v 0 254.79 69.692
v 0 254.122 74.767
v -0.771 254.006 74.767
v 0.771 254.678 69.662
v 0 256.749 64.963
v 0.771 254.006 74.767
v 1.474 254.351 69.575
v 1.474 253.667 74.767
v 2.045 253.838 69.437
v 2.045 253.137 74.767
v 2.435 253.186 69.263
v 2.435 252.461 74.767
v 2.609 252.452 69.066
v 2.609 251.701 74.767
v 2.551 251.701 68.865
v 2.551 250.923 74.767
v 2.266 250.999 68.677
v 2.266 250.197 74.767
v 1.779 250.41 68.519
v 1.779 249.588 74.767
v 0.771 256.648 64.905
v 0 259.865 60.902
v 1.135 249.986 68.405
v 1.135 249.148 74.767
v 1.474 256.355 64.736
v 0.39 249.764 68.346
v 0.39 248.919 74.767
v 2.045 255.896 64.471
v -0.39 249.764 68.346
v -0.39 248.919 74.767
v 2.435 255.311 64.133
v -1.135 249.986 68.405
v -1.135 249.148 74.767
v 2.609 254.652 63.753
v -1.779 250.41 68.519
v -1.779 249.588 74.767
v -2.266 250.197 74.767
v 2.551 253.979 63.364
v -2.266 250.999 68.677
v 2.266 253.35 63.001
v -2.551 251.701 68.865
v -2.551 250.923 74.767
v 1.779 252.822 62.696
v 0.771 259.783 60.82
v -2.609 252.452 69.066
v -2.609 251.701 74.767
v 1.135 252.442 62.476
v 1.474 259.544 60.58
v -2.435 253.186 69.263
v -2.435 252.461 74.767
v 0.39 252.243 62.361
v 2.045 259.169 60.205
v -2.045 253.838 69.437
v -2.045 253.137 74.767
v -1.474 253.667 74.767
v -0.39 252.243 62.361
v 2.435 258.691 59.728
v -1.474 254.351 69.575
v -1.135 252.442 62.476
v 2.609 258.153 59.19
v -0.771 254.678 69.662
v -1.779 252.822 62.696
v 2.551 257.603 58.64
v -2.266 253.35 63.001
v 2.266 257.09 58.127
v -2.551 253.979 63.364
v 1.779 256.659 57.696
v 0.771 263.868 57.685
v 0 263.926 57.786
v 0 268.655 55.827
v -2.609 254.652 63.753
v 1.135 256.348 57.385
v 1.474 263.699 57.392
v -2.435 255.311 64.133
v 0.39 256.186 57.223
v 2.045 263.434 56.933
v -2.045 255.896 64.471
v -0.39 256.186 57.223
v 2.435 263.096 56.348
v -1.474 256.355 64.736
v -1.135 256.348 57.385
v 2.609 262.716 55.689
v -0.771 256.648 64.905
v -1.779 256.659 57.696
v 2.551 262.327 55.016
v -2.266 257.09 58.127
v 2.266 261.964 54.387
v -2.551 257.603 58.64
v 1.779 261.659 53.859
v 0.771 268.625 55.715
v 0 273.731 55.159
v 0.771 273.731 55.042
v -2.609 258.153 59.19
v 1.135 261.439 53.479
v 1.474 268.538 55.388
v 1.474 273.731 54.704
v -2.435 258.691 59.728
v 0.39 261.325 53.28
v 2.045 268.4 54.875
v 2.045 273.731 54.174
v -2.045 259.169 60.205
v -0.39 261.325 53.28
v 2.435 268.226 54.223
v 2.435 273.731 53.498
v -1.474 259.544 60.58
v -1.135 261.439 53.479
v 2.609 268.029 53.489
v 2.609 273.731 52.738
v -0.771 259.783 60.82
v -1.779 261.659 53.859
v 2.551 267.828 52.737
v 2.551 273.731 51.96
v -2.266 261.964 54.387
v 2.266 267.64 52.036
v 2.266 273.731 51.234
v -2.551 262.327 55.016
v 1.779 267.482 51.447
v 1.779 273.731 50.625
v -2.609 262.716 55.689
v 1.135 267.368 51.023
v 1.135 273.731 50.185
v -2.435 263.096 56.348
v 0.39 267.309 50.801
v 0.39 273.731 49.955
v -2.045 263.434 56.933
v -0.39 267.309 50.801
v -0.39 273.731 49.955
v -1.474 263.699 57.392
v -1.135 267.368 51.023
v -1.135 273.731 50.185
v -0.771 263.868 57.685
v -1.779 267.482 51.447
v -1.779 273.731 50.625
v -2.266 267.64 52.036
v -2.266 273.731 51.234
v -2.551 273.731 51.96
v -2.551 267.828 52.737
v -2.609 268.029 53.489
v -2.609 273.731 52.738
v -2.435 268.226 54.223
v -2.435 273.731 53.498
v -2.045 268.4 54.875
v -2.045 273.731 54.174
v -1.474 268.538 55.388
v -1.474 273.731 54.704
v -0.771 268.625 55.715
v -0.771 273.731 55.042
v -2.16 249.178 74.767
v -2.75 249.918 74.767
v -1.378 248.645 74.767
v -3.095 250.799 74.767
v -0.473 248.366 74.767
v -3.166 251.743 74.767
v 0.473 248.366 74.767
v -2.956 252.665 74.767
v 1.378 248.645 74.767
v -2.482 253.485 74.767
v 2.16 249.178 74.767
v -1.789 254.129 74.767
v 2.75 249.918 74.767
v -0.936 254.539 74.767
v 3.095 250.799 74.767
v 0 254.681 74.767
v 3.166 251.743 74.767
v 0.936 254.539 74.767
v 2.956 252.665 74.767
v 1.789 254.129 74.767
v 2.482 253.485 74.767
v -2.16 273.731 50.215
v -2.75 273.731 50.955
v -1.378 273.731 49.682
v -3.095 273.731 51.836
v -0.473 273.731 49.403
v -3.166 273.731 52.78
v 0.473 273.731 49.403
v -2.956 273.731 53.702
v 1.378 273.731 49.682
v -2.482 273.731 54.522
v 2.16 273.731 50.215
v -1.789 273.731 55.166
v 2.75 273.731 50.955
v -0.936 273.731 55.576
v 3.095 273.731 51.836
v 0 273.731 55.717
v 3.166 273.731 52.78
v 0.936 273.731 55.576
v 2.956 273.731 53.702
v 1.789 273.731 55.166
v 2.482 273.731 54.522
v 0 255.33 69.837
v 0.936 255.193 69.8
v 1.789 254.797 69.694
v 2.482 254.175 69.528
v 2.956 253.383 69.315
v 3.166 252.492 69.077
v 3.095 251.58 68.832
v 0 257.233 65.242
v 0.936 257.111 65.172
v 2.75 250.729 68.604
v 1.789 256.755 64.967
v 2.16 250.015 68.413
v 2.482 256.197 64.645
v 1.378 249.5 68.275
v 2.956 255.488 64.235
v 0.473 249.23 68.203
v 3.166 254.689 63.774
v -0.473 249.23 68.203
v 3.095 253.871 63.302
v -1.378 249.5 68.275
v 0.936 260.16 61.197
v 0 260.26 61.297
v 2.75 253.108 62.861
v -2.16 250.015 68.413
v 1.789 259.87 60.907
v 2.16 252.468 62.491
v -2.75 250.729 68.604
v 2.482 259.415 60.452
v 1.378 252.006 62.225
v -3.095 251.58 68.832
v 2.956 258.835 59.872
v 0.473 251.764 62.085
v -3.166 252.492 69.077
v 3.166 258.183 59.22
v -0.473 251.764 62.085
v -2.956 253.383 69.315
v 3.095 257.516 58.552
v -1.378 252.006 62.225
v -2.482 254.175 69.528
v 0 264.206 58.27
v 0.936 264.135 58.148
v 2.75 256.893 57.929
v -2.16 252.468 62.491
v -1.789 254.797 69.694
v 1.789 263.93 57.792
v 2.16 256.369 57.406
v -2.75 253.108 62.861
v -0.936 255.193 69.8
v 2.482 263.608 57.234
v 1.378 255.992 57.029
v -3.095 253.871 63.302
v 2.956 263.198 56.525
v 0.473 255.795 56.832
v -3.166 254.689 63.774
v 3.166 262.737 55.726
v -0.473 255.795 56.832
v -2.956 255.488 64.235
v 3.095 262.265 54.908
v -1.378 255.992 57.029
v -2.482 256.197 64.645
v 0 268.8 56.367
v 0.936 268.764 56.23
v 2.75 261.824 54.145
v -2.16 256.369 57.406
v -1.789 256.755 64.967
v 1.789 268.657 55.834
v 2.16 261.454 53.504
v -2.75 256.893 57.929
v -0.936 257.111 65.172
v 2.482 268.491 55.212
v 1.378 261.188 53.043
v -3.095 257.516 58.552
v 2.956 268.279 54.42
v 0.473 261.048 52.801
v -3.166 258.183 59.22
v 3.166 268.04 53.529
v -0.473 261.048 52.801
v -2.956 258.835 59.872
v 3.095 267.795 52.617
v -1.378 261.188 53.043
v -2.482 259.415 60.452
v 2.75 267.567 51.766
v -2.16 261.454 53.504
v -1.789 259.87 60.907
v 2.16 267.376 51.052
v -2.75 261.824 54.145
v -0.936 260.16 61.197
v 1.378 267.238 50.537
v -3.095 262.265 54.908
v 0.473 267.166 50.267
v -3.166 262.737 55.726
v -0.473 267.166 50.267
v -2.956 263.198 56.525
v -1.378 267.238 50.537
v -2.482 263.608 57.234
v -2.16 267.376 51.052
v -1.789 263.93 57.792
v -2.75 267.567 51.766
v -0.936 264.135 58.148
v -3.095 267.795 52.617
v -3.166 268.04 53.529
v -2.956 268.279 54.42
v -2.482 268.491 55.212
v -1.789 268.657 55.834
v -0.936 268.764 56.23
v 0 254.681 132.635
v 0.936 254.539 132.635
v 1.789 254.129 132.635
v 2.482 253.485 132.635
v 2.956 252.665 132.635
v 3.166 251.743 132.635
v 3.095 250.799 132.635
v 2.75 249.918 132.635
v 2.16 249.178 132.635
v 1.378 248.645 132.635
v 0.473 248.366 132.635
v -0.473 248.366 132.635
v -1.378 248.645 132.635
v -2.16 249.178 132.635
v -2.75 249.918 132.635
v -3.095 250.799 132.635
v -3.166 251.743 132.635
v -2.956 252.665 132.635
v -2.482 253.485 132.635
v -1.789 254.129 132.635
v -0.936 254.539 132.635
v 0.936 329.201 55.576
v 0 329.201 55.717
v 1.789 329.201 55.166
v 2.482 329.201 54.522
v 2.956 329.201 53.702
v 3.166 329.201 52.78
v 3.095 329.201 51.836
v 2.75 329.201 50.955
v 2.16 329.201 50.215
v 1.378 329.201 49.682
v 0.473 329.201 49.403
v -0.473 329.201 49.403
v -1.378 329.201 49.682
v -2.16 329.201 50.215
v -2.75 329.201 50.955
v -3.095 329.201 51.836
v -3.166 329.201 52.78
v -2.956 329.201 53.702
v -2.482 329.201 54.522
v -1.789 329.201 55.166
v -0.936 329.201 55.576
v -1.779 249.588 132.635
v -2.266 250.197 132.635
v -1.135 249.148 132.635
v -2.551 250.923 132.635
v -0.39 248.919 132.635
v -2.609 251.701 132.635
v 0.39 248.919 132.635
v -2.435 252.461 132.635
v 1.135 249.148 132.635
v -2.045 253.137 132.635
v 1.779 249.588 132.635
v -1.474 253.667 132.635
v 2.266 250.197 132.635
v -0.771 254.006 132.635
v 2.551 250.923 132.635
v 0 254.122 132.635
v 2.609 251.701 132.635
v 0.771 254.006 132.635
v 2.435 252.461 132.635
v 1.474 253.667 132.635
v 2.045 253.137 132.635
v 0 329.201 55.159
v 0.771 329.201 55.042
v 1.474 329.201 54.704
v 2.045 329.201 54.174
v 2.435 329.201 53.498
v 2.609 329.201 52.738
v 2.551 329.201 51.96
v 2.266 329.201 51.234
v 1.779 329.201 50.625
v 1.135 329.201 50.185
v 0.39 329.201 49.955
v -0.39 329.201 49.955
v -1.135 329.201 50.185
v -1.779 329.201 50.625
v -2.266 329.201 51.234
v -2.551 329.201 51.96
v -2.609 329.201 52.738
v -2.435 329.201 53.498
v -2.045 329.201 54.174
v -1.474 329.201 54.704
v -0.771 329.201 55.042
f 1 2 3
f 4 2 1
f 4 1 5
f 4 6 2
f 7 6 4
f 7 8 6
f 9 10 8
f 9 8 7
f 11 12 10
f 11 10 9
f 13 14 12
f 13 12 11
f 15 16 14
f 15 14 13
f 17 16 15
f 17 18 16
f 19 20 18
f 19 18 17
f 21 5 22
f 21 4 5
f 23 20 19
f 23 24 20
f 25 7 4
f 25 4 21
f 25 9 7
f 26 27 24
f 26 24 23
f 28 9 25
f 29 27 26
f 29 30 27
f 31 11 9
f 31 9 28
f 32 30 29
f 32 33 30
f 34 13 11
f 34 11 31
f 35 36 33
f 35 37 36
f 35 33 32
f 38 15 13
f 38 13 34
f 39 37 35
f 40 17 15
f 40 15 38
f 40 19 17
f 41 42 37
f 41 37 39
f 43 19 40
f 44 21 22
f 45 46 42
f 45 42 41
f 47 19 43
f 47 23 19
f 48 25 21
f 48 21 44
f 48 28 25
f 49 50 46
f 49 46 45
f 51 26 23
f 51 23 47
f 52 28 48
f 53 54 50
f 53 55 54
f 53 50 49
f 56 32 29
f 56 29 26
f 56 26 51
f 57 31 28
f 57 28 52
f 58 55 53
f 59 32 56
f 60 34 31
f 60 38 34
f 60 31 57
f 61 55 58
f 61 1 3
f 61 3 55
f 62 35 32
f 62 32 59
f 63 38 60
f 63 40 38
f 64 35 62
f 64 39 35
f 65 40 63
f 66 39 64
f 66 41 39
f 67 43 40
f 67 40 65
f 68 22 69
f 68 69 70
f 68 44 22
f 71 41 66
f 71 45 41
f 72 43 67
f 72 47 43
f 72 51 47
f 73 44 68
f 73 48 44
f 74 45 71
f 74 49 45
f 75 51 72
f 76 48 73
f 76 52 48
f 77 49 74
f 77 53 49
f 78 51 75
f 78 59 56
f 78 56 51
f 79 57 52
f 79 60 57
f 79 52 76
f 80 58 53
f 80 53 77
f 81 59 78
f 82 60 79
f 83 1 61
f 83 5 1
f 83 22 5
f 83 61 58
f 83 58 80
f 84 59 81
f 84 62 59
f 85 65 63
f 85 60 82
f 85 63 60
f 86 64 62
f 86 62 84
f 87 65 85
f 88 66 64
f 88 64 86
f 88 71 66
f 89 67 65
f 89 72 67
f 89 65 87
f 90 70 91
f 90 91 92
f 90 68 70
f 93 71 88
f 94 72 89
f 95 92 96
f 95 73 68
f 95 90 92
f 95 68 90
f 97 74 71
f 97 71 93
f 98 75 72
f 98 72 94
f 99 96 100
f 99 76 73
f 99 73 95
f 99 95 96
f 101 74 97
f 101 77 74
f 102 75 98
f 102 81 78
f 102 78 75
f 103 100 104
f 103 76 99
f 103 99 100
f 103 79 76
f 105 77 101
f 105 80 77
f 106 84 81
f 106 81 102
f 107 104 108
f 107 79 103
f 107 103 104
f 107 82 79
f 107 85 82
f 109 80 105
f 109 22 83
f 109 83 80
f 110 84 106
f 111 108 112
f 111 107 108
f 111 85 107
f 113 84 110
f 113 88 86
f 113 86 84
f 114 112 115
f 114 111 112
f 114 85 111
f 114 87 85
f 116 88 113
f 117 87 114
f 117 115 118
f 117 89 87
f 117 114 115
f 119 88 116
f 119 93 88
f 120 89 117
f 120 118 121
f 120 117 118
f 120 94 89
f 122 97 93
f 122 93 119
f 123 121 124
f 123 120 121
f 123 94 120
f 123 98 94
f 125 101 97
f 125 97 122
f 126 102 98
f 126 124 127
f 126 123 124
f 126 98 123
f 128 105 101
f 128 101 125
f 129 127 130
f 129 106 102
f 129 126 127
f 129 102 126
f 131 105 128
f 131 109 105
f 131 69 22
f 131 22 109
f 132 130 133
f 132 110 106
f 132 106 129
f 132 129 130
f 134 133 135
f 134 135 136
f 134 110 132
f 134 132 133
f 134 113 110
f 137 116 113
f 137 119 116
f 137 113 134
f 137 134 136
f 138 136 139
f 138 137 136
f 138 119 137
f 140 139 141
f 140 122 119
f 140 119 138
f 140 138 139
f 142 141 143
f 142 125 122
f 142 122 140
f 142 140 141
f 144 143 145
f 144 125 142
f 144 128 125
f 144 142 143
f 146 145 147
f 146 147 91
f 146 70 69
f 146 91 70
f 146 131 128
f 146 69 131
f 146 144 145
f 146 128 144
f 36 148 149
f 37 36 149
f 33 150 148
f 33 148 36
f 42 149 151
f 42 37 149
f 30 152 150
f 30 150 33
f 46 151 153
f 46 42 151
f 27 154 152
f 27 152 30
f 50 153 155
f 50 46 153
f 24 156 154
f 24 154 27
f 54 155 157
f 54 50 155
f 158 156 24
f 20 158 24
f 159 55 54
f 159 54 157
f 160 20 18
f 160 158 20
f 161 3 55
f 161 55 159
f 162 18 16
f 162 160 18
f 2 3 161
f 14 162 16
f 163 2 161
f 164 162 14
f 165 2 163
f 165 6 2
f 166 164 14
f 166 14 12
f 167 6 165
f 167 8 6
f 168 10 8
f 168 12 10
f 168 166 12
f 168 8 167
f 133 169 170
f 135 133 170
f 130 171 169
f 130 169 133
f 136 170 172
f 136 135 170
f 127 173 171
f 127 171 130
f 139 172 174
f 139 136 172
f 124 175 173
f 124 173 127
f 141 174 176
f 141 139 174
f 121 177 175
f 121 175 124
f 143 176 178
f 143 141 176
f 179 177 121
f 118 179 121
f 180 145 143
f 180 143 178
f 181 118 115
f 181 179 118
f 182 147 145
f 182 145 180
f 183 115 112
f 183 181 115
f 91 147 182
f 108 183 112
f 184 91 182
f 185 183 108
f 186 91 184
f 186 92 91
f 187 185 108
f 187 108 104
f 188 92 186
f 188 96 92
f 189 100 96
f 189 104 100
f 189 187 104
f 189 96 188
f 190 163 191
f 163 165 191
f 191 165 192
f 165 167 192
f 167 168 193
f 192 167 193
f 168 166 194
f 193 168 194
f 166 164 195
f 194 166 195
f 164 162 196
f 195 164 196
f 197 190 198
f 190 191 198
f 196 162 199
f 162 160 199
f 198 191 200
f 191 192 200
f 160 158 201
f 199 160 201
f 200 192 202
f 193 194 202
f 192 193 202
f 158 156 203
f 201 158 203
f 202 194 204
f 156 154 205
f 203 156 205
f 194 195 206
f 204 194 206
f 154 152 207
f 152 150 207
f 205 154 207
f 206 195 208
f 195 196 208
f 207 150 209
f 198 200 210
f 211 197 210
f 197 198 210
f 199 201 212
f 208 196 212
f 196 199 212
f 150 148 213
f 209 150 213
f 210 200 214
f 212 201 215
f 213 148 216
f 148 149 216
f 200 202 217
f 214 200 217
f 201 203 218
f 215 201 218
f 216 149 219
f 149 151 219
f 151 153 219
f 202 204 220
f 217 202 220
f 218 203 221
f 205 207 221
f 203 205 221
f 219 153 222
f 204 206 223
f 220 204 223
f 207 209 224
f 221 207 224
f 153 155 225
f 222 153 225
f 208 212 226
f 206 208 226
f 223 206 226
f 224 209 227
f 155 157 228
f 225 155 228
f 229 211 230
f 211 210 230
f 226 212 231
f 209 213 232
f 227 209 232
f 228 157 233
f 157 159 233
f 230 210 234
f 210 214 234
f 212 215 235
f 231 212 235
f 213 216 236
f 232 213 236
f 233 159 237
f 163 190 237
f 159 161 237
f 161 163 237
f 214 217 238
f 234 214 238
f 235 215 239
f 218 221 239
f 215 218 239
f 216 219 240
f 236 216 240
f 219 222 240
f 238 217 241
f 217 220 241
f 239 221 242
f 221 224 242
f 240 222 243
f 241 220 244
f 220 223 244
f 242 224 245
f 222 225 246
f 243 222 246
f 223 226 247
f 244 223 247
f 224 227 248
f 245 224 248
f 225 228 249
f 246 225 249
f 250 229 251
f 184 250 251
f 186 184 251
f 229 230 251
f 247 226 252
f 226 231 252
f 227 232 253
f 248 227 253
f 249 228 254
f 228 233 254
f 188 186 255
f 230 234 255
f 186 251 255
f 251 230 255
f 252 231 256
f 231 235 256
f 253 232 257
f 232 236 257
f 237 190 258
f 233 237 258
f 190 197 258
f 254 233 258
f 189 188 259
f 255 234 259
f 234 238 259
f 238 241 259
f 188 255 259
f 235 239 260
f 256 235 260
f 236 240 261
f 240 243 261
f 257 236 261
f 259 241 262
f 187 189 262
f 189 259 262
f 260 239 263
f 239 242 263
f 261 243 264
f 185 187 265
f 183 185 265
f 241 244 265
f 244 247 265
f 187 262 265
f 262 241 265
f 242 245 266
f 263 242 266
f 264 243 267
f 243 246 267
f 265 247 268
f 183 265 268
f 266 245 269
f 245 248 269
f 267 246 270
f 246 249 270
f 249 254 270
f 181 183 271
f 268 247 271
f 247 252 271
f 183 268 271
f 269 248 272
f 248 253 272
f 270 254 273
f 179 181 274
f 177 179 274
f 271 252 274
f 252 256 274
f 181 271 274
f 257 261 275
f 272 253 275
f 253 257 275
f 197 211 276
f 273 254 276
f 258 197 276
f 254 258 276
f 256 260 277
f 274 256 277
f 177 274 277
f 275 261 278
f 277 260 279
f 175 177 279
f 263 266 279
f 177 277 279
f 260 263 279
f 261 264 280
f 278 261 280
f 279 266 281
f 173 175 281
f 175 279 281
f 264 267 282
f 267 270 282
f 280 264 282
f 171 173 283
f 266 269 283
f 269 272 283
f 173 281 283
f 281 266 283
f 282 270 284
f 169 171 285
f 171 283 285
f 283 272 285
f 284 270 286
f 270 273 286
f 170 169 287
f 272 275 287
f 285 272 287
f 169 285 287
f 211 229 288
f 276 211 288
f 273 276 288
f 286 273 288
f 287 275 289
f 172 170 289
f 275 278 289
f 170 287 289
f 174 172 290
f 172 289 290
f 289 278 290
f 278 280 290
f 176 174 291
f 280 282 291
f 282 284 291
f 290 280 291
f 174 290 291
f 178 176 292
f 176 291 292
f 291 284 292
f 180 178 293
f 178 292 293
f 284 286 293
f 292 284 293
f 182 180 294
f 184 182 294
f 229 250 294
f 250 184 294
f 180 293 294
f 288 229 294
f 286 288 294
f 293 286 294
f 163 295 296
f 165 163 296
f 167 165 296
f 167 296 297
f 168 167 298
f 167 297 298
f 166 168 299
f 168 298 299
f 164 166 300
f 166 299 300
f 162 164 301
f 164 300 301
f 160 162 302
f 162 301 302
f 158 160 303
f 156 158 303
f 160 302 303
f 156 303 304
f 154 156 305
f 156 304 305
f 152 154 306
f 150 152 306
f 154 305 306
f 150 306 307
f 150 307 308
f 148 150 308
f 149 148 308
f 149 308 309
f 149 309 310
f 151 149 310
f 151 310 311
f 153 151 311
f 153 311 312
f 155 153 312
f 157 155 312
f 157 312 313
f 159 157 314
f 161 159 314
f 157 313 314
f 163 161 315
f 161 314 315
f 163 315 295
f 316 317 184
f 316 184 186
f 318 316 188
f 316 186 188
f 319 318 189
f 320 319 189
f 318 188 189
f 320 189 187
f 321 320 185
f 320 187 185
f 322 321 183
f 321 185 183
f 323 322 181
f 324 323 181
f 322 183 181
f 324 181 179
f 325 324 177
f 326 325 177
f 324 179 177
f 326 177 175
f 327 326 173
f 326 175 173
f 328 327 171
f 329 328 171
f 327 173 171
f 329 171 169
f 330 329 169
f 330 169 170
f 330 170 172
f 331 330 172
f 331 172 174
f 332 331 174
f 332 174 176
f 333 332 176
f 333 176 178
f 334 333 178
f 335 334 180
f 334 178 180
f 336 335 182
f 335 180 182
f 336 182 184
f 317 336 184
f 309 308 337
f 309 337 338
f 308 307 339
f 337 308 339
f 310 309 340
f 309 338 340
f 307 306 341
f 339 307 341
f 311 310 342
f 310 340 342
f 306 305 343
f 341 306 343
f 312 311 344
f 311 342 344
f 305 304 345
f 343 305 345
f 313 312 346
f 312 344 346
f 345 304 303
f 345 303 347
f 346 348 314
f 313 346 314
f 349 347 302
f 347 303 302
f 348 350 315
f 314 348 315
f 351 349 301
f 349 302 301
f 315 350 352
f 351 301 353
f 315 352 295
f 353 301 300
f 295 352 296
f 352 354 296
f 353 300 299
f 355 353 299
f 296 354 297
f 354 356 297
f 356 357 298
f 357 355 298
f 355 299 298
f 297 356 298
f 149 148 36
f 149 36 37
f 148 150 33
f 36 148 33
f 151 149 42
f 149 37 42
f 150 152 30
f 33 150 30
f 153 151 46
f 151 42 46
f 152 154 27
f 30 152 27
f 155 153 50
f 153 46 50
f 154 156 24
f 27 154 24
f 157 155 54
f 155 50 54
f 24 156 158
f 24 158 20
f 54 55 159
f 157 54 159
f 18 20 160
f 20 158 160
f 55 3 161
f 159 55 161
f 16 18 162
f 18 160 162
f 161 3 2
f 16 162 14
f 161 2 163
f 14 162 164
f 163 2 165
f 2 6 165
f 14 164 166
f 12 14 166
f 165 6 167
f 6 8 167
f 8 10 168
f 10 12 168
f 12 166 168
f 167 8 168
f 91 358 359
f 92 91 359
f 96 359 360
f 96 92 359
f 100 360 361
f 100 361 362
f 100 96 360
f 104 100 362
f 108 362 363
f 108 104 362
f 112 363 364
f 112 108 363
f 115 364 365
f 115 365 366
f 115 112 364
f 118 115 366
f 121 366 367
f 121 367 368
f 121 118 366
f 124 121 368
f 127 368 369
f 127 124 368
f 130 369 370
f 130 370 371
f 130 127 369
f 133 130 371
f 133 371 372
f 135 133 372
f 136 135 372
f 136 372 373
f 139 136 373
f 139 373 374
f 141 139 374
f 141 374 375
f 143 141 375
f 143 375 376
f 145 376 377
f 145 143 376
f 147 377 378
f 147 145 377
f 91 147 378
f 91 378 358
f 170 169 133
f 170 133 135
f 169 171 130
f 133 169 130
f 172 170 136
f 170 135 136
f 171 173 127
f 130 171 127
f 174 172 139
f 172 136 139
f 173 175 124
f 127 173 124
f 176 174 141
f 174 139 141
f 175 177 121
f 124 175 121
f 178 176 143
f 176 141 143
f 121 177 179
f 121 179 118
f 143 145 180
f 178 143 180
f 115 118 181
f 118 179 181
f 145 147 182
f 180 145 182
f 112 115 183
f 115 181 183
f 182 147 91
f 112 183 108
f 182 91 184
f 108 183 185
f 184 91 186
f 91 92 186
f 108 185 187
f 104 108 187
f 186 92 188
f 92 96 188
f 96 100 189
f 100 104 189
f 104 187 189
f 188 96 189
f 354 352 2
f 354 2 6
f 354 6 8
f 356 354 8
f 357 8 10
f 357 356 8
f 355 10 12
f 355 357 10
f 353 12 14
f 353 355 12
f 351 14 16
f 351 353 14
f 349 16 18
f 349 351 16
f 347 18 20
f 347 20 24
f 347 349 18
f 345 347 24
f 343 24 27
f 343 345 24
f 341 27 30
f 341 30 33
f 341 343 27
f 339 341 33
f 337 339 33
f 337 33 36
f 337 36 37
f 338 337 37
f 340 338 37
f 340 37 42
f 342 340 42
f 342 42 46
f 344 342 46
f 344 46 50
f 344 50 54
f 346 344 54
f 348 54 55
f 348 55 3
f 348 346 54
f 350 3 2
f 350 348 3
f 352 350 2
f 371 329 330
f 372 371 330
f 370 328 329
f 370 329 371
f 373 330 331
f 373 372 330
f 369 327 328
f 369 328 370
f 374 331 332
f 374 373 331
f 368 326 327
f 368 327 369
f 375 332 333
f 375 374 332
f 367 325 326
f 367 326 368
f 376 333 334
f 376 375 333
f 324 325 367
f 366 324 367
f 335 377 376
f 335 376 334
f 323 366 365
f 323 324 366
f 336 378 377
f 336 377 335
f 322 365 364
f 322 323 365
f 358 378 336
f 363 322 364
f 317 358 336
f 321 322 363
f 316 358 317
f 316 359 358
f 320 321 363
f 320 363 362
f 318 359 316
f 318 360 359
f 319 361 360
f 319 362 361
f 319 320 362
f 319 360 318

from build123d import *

# Parameters (mm, degrees)
SKETCH11_R                = 3.175
SKETCH11_R_2              = 2.6162
PIPE_0_5_SCH_40_1_DEPTH   = 57.867055849
SKETCH11_ON_SEGMENT_2_R   = 3.175
SKETCH11_ON_SEGMENT_2_R_2 = 2.6162
PIPE_0_5_SCH_40_1_2_ANGLE = 90
SKETCH11_ON_SEGMENT_3_R   = 3.175
SKETCH11_ON_SEGMENT_3_R_2 = 2.6162
PIPE_0_5_SCH_40_1_3_DEPTH = 55.470107083


with BuildPart() as part:
    # Sketch11 → Pipe 0.5 SCH 40(1) (new body)
    with BuildSketch(Plane(origin=(0, 251.505538406, 132.634510624), x_dir=(0, 1, 0), z_dir=(0, 0, -1))):
        Circle(SKETCH11_R)
        Circle(SKETCH11_R_2, mode=Mode.SUBTRACT)
    extrude(amount=PIPE_0_5_SCH_40_1_DEPTH)


with BuildPart() as body_2:
    # Sketch11 on segment 2 (carried to the start of arc 2) → Pipe 0.5 SCH 40_1 2 (revolve)
    with BuildSketch(Plane(origin=(0, 251.505538406, 74.767454775), x_dir=(0, 1, 0), z_dir=(0, 0, -1))):
        Circle(SKETCH11_ON_SEGMENT_2_R)
        Circle(SKETCH11_ON_SEGMENT_2_R_2, mode=Mode.SUBTRACT)
    revolve(axis=Axis((0, 273.730538406, 74.767454775), (1, 0, 0)), revolution_arc=PIPE_0_5_SCH_40_1_2_ANGLE)


with BuildPart() as body_3:
    # Sketch11 on segment 3 (carried to segment 3) → Pipe 0.5 SCH 40_1 3 (new body)
    with BuildSketch(Plane(origin=(0, 273.730538406, 52.542454775), x_dir=(0, 0, 1), z_dir=(0, 1, 0))):
        Circle(SKETCH11_ON_SEGMENT_3_R)
        Circle(SKETCH11_ON_SEGMENT_3_R_2, mode=Mode.SUBTRACT)
    extrude(amount=PIPE_0_5_SCH_40_1_3_DEPTH)


solid = Compound([part.part, body_2.part, body_3.part])
